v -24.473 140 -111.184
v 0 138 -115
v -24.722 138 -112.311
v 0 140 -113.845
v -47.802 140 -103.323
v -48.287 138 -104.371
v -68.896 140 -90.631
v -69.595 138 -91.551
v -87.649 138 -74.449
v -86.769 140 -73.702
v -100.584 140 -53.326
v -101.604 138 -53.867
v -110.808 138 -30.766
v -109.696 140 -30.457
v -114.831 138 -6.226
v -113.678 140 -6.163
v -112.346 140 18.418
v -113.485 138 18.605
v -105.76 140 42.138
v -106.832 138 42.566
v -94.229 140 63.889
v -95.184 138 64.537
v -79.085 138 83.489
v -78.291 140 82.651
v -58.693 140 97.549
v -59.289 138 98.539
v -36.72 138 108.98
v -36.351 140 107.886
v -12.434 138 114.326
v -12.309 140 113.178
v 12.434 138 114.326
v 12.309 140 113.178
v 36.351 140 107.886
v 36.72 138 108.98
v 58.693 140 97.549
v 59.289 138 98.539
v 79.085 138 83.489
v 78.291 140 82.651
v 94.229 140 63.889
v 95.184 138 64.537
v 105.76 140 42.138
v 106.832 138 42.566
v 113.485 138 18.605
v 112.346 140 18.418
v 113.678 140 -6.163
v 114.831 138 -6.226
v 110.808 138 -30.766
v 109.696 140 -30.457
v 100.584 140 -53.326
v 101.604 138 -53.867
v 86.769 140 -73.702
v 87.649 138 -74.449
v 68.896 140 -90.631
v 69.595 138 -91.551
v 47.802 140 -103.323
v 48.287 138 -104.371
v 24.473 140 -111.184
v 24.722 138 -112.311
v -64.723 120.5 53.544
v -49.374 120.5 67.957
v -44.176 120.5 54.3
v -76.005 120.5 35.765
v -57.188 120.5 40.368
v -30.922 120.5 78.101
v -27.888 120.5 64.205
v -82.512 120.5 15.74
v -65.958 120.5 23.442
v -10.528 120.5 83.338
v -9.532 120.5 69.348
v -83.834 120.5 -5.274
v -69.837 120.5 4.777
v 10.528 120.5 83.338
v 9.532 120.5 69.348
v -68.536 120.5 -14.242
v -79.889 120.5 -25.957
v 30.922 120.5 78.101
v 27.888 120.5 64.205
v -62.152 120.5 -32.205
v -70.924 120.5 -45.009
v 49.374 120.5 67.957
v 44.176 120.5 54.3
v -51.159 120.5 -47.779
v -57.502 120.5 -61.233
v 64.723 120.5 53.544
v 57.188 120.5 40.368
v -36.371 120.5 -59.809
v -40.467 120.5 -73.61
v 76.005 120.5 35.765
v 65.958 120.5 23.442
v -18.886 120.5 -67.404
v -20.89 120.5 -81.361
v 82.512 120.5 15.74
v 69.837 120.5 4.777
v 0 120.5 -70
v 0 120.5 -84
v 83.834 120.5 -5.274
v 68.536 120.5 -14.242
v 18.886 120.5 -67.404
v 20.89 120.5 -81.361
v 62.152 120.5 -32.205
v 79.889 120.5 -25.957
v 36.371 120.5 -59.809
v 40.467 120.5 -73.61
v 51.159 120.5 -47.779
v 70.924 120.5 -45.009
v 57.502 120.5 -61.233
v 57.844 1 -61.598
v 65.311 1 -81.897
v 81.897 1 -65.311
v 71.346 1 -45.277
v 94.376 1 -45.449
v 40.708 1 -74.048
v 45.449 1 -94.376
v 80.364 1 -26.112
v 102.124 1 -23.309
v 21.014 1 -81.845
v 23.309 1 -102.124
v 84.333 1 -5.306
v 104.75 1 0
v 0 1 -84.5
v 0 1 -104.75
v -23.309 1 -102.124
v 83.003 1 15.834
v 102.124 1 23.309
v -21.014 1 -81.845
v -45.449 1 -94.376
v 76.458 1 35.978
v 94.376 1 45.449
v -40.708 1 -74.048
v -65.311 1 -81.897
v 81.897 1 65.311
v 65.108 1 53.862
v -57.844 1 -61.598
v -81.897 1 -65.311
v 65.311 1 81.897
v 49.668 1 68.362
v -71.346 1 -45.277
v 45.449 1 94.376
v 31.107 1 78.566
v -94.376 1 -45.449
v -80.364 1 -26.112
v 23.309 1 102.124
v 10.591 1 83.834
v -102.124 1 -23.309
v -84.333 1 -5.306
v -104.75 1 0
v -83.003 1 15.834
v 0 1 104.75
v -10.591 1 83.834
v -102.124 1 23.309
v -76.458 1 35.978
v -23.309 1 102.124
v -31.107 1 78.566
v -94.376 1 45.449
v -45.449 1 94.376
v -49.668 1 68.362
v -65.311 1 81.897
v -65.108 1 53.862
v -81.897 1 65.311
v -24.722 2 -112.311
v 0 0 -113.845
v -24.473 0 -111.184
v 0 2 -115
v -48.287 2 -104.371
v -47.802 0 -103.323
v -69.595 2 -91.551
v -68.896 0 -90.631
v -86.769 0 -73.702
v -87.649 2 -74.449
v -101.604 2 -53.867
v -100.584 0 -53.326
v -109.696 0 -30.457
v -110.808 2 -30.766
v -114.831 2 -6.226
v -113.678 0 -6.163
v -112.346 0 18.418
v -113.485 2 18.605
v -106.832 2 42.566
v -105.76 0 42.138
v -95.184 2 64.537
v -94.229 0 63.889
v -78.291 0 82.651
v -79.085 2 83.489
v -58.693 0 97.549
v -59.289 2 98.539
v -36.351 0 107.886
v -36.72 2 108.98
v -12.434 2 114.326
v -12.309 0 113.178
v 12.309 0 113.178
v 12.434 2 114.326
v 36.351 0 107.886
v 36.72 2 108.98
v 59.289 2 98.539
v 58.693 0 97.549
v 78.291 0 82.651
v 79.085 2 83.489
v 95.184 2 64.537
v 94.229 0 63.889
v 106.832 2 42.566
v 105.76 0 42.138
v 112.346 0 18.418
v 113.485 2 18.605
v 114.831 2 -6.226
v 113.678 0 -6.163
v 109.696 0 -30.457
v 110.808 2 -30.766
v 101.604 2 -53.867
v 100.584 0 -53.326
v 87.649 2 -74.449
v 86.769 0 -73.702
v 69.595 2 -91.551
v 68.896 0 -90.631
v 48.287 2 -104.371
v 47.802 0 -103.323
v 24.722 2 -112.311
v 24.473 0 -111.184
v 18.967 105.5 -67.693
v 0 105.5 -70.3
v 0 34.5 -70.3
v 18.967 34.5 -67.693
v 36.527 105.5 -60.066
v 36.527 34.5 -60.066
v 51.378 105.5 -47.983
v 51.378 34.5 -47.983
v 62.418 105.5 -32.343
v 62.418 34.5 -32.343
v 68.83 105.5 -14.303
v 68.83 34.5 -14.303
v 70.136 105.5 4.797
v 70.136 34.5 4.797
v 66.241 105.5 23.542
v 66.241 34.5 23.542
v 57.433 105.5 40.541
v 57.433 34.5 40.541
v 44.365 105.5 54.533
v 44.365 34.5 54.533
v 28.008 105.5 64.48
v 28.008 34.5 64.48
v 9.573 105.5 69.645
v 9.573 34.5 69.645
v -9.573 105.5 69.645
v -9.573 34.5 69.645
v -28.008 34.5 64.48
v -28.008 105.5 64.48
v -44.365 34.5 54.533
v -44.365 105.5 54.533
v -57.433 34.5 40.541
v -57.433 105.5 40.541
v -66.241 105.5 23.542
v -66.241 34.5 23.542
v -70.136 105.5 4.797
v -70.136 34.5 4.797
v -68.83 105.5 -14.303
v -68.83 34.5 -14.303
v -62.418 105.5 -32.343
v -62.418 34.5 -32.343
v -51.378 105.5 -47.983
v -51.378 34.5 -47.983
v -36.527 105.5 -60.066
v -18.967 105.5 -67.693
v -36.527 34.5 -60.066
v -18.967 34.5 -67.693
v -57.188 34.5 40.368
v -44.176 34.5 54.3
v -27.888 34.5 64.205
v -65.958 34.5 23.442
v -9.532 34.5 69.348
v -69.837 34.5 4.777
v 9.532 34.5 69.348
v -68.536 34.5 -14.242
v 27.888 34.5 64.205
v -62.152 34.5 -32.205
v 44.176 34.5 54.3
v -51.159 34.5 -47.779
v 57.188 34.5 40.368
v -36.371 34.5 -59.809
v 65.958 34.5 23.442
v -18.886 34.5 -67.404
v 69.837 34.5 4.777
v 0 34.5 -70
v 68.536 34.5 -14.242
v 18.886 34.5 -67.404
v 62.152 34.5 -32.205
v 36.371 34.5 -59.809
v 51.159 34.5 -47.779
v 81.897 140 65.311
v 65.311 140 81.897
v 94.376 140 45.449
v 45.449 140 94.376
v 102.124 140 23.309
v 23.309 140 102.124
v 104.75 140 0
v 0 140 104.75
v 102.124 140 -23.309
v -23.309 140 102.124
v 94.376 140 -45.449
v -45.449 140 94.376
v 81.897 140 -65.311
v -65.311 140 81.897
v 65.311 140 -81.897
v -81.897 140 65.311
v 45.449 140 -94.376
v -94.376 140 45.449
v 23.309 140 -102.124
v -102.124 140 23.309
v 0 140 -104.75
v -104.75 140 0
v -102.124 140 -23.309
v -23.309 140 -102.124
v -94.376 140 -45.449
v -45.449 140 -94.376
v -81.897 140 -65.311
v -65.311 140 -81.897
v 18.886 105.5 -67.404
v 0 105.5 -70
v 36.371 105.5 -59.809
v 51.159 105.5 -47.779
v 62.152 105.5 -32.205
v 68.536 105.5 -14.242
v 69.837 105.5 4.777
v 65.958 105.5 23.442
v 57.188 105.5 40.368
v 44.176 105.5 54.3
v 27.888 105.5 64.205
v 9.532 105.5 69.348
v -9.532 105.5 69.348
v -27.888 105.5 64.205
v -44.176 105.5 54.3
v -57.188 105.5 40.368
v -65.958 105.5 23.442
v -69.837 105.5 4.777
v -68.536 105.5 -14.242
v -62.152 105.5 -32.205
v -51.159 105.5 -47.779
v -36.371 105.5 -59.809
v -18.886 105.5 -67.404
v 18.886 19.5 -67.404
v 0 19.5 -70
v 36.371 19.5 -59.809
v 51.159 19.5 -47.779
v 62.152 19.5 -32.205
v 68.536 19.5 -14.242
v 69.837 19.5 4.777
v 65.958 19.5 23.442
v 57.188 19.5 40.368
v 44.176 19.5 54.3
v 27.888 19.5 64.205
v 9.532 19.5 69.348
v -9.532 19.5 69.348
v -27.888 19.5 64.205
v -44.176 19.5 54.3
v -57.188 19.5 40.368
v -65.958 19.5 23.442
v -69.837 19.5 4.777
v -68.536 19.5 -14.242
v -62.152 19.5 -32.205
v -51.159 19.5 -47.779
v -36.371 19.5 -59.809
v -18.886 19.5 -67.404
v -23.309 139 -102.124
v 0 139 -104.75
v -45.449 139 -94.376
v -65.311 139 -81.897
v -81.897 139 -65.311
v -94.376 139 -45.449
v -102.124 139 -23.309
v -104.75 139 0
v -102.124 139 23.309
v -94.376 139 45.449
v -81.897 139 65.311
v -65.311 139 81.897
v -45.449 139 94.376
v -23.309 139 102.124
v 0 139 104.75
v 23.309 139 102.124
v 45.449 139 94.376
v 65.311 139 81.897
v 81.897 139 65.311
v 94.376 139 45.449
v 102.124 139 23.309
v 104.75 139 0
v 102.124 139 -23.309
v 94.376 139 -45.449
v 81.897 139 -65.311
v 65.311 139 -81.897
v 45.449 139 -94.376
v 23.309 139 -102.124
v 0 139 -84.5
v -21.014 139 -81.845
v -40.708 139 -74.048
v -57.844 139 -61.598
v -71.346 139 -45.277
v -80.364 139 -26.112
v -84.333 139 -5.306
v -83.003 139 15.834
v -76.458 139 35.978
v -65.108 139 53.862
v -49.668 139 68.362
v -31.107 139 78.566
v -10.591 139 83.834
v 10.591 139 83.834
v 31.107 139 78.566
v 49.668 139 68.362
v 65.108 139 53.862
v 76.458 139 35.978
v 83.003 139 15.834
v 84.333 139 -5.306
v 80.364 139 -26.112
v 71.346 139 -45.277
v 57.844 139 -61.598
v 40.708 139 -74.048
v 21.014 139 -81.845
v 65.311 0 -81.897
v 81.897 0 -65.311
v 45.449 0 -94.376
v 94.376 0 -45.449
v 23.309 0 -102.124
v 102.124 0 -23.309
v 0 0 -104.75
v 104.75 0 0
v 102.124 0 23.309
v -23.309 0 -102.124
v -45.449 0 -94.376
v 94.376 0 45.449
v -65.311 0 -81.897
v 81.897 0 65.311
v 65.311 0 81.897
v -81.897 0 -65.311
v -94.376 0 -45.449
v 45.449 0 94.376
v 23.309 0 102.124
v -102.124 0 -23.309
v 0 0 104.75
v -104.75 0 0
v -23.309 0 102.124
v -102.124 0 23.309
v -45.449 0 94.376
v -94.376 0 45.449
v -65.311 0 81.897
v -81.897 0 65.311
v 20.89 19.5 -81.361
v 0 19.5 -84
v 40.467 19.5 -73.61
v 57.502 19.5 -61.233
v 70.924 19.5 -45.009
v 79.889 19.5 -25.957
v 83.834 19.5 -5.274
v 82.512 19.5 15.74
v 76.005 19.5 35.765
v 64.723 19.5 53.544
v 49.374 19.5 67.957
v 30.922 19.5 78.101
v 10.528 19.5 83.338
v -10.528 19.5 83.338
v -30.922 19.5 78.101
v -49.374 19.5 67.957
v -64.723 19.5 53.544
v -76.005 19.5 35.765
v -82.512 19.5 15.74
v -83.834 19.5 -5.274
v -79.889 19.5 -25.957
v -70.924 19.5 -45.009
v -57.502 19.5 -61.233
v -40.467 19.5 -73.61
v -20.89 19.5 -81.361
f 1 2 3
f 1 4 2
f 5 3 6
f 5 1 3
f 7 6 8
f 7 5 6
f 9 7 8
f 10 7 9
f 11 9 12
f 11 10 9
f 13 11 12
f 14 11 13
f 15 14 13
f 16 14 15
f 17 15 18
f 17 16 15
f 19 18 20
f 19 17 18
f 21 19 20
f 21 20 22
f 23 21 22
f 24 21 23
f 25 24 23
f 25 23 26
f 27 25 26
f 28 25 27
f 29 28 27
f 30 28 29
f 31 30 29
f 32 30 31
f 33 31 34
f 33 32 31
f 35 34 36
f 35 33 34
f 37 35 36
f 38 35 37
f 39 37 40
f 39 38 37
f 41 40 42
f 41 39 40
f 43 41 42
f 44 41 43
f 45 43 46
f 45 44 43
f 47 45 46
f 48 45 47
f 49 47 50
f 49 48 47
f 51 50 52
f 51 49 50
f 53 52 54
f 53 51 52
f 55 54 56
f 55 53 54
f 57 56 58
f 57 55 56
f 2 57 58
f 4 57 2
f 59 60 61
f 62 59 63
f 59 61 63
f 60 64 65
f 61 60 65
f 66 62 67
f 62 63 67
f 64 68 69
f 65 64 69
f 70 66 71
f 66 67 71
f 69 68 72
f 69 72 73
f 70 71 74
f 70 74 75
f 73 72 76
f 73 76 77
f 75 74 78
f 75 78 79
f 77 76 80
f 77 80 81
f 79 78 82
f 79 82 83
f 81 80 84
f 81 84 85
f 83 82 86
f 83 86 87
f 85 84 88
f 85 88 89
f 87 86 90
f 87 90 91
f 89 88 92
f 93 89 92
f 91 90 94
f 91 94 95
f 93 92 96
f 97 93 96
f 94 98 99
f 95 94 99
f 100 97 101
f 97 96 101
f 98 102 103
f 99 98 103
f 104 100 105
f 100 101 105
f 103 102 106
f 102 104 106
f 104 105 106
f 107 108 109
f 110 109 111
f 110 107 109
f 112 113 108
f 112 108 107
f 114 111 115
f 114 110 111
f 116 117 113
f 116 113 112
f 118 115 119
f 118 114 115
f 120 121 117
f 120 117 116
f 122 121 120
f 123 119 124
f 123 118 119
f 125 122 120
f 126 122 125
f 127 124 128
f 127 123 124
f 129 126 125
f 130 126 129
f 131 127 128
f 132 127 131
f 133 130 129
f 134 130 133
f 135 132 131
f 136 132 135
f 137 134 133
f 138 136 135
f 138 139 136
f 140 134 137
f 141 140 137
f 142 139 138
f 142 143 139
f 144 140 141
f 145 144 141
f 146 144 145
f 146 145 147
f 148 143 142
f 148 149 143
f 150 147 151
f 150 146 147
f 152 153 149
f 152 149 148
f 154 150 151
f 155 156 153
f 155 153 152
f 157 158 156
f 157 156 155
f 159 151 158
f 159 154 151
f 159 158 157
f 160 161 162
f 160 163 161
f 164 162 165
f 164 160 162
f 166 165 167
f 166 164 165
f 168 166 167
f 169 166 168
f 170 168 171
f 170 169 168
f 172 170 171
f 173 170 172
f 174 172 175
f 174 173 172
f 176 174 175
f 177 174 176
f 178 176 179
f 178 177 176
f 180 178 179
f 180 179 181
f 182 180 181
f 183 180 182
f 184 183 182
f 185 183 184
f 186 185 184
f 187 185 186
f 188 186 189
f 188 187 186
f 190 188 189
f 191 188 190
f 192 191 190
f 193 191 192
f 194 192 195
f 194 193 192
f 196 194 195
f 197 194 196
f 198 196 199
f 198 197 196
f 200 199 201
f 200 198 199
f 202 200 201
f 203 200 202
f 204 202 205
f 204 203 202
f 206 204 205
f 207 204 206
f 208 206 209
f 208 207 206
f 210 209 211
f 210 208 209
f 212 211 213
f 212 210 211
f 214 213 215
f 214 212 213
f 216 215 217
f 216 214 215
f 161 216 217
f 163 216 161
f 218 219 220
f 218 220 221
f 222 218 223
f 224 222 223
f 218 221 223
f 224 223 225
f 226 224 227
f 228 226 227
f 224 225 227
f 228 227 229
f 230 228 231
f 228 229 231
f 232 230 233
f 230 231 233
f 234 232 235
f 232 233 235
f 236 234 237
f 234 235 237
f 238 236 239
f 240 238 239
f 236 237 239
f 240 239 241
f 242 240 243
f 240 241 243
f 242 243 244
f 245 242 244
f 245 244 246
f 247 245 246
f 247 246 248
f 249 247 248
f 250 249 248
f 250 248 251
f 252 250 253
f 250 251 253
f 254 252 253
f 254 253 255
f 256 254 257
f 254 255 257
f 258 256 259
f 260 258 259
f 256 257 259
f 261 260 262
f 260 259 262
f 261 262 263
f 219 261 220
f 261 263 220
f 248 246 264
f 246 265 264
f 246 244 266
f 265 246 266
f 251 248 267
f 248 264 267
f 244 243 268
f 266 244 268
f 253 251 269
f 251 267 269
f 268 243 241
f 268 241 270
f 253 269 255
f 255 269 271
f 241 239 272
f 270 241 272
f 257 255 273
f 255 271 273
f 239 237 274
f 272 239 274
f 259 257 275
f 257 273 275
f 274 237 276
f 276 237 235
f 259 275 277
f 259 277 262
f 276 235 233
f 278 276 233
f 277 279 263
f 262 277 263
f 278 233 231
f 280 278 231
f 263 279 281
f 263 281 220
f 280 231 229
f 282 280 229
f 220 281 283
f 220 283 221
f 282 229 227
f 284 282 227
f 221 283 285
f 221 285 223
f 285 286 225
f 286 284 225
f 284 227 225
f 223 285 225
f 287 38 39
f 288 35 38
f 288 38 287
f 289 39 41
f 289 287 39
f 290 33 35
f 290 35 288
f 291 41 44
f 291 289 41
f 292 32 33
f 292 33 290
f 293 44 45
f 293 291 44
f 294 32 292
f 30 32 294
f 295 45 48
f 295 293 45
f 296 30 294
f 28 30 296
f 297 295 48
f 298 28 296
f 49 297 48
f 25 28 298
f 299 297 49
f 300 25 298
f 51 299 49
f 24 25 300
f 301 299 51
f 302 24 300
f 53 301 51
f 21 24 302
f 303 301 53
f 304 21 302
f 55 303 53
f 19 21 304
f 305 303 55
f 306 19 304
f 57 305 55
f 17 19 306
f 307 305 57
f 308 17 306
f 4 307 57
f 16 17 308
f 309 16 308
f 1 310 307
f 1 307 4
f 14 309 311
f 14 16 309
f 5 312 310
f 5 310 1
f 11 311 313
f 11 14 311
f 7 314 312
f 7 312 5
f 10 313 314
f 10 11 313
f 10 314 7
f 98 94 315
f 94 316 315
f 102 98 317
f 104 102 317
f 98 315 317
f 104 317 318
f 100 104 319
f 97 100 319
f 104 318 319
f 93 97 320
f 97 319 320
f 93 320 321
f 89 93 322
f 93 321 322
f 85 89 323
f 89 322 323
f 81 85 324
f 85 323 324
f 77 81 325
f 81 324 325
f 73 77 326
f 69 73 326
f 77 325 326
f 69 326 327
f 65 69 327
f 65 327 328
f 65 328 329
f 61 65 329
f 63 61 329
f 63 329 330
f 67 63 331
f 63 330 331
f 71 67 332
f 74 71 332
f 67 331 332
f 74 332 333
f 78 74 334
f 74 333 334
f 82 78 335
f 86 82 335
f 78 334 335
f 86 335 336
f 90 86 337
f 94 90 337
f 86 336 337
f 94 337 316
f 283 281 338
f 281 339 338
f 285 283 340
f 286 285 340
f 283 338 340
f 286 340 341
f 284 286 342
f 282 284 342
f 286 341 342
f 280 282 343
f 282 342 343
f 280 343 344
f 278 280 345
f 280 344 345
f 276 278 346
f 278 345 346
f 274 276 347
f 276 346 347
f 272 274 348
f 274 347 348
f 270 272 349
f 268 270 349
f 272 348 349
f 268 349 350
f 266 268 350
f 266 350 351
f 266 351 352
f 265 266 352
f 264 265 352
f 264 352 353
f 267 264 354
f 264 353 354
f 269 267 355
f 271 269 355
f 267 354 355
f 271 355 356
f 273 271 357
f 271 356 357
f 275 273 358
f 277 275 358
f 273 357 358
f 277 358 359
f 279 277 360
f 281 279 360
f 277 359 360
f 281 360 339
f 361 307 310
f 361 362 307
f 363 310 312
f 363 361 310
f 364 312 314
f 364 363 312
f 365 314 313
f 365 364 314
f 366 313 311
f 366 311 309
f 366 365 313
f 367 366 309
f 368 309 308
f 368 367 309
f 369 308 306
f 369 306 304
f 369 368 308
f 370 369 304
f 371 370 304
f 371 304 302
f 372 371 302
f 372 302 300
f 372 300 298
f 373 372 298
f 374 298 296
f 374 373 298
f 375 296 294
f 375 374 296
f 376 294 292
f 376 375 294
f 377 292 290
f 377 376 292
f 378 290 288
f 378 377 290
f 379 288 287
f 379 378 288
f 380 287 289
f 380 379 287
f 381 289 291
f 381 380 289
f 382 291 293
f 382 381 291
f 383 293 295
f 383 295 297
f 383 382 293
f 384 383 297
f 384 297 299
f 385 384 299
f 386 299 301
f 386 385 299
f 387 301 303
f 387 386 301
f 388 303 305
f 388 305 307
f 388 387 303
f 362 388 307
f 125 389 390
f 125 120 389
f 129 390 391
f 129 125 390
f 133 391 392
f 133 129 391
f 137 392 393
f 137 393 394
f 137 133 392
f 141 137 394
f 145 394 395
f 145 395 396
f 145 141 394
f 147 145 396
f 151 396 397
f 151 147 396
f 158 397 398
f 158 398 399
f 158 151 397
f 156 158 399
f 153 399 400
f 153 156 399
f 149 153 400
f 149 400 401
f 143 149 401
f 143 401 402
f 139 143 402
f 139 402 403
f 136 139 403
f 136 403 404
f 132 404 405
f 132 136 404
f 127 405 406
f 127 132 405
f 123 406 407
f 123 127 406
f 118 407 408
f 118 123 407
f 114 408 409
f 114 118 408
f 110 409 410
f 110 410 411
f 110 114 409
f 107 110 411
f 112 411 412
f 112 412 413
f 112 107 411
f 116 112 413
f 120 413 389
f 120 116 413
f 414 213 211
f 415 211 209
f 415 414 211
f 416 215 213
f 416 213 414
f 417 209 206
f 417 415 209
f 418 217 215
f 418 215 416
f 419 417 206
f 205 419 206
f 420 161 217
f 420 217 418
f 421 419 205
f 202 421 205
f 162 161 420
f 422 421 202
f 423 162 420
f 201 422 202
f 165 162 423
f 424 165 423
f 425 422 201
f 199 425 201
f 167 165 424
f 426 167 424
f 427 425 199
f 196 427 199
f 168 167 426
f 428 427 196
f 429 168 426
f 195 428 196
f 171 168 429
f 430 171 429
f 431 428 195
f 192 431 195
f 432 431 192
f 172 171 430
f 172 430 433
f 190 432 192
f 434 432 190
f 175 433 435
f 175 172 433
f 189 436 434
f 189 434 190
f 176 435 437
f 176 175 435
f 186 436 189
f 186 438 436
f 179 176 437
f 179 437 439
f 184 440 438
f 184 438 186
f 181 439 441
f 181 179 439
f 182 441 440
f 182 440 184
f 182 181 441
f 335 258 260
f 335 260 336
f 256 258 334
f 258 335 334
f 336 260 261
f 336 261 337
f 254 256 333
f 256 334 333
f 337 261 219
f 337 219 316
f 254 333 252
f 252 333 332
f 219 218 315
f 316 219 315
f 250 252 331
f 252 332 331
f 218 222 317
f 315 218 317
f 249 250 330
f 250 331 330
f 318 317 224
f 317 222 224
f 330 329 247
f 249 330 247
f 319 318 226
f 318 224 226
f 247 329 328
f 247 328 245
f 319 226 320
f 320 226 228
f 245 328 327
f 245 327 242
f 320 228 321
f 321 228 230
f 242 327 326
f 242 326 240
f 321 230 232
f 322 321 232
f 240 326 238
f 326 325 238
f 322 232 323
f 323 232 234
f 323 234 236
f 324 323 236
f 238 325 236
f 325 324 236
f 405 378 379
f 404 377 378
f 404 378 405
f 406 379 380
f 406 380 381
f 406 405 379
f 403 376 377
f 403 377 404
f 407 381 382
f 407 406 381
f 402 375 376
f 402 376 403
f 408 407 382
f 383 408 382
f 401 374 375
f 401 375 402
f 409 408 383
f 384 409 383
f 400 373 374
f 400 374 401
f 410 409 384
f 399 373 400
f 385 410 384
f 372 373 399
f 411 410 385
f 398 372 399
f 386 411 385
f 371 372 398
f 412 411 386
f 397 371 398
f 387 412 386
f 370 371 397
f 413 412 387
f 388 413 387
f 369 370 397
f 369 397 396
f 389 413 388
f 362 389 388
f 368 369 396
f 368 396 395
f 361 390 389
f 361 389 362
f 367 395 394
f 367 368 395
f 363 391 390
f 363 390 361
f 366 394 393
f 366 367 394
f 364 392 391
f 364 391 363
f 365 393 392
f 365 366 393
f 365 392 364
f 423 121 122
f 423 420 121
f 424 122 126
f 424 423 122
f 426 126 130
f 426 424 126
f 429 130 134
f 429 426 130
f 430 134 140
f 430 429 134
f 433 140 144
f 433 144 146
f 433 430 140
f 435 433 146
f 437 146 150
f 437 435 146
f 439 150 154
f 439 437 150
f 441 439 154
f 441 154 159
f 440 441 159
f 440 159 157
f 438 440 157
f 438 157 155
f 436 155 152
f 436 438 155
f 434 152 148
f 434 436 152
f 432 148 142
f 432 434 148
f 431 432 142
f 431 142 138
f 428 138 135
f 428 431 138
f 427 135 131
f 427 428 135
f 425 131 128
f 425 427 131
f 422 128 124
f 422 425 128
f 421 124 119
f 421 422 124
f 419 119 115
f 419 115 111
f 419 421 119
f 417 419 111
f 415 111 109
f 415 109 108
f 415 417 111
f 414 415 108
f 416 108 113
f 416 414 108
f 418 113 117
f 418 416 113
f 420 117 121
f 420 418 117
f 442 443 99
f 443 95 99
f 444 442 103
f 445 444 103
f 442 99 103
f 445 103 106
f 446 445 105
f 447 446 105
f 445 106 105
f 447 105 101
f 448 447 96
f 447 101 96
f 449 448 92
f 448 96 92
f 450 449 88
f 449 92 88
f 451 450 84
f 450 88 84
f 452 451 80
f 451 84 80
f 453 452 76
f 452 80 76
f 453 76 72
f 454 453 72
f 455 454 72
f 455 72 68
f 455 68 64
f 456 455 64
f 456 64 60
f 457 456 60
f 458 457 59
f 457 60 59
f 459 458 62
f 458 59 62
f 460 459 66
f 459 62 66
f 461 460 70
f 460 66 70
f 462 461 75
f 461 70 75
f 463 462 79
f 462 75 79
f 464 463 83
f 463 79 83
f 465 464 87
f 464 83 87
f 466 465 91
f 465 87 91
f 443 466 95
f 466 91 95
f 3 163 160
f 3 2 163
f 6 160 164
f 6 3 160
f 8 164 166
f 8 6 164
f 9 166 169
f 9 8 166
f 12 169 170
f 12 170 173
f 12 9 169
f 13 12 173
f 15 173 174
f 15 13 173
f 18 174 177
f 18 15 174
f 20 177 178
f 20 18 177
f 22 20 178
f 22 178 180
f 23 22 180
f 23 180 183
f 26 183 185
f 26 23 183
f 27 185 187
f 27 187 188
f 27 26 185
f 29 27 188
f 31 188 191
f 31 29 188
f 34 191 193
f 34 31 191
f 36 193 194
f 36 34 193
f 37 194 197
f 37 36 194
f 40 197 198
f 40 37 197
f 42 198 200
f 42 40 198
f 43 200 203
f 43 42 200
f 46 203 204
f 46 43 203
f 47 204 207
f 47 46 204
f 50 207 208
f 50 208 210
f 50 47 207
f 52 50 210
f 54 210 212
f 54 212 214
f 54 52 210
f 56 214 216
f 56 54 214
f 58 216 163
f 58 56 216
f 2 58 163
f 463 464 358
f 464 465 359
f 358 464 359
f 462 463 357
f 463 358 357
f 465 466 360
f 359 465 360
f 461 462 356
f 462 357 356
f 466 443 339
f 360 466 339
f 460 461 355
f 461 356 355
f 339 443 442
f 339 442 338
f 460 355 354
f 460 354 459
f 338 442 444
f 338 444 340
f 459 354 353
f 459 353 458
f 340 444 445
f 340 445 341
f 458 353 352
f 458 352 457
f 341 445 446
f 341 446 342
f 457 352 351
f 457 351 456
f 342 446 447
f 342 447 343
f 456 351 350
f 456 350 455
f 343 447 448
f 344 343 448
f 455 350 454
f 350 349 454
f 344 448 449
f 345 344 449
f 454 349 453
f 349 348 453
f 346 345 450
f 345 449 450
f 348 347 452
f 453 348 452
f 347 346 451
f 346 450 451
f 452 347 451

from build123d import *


with BuildPart() as part:
    # 草圖1 → 旋轉1 (revolve)
    with BuildSketch(Plane.XY, mode=Mode.PRIVATE) as revolve_1_sk:
        Polygon((70, 120.5), (70, 105.5), (70.3, 105.5), (70.3, 34.5), (70, 34.5), (70, 19.5), (84, 19.5), (84, 120.5), align=None)
    revolve(revolve_1_sk.sketch.rotate(Axis((0, 120.5, 0), (0, -1, 0)), 270), axis=Axis((0, 120.5, 0), (0, -1, 0)))


with BuildPart() as body_2:
    # 草圖2 → 旋轉2 (revolve)
    with BuildSketch(Plane.XY, mode=Mode.PRIVATE) as revolve_2_sk:
        Polygon((84.5, 139), (84.5, 1), (104.75, 1), (104.75, 0), (113.845299462, 0), (115, 2), (115, 138), (113.845299462, 140), (104.75, 140), (104.75, 139), align=None)
    revolve(revolve_2_sk.sketch.rotate(Axis((0, 0, 0), (0, 1, 0)), 90), axis=Axis((0, 0, 0), (0, 1, 0)))


solid = Compound([part.part, body_2.part])
